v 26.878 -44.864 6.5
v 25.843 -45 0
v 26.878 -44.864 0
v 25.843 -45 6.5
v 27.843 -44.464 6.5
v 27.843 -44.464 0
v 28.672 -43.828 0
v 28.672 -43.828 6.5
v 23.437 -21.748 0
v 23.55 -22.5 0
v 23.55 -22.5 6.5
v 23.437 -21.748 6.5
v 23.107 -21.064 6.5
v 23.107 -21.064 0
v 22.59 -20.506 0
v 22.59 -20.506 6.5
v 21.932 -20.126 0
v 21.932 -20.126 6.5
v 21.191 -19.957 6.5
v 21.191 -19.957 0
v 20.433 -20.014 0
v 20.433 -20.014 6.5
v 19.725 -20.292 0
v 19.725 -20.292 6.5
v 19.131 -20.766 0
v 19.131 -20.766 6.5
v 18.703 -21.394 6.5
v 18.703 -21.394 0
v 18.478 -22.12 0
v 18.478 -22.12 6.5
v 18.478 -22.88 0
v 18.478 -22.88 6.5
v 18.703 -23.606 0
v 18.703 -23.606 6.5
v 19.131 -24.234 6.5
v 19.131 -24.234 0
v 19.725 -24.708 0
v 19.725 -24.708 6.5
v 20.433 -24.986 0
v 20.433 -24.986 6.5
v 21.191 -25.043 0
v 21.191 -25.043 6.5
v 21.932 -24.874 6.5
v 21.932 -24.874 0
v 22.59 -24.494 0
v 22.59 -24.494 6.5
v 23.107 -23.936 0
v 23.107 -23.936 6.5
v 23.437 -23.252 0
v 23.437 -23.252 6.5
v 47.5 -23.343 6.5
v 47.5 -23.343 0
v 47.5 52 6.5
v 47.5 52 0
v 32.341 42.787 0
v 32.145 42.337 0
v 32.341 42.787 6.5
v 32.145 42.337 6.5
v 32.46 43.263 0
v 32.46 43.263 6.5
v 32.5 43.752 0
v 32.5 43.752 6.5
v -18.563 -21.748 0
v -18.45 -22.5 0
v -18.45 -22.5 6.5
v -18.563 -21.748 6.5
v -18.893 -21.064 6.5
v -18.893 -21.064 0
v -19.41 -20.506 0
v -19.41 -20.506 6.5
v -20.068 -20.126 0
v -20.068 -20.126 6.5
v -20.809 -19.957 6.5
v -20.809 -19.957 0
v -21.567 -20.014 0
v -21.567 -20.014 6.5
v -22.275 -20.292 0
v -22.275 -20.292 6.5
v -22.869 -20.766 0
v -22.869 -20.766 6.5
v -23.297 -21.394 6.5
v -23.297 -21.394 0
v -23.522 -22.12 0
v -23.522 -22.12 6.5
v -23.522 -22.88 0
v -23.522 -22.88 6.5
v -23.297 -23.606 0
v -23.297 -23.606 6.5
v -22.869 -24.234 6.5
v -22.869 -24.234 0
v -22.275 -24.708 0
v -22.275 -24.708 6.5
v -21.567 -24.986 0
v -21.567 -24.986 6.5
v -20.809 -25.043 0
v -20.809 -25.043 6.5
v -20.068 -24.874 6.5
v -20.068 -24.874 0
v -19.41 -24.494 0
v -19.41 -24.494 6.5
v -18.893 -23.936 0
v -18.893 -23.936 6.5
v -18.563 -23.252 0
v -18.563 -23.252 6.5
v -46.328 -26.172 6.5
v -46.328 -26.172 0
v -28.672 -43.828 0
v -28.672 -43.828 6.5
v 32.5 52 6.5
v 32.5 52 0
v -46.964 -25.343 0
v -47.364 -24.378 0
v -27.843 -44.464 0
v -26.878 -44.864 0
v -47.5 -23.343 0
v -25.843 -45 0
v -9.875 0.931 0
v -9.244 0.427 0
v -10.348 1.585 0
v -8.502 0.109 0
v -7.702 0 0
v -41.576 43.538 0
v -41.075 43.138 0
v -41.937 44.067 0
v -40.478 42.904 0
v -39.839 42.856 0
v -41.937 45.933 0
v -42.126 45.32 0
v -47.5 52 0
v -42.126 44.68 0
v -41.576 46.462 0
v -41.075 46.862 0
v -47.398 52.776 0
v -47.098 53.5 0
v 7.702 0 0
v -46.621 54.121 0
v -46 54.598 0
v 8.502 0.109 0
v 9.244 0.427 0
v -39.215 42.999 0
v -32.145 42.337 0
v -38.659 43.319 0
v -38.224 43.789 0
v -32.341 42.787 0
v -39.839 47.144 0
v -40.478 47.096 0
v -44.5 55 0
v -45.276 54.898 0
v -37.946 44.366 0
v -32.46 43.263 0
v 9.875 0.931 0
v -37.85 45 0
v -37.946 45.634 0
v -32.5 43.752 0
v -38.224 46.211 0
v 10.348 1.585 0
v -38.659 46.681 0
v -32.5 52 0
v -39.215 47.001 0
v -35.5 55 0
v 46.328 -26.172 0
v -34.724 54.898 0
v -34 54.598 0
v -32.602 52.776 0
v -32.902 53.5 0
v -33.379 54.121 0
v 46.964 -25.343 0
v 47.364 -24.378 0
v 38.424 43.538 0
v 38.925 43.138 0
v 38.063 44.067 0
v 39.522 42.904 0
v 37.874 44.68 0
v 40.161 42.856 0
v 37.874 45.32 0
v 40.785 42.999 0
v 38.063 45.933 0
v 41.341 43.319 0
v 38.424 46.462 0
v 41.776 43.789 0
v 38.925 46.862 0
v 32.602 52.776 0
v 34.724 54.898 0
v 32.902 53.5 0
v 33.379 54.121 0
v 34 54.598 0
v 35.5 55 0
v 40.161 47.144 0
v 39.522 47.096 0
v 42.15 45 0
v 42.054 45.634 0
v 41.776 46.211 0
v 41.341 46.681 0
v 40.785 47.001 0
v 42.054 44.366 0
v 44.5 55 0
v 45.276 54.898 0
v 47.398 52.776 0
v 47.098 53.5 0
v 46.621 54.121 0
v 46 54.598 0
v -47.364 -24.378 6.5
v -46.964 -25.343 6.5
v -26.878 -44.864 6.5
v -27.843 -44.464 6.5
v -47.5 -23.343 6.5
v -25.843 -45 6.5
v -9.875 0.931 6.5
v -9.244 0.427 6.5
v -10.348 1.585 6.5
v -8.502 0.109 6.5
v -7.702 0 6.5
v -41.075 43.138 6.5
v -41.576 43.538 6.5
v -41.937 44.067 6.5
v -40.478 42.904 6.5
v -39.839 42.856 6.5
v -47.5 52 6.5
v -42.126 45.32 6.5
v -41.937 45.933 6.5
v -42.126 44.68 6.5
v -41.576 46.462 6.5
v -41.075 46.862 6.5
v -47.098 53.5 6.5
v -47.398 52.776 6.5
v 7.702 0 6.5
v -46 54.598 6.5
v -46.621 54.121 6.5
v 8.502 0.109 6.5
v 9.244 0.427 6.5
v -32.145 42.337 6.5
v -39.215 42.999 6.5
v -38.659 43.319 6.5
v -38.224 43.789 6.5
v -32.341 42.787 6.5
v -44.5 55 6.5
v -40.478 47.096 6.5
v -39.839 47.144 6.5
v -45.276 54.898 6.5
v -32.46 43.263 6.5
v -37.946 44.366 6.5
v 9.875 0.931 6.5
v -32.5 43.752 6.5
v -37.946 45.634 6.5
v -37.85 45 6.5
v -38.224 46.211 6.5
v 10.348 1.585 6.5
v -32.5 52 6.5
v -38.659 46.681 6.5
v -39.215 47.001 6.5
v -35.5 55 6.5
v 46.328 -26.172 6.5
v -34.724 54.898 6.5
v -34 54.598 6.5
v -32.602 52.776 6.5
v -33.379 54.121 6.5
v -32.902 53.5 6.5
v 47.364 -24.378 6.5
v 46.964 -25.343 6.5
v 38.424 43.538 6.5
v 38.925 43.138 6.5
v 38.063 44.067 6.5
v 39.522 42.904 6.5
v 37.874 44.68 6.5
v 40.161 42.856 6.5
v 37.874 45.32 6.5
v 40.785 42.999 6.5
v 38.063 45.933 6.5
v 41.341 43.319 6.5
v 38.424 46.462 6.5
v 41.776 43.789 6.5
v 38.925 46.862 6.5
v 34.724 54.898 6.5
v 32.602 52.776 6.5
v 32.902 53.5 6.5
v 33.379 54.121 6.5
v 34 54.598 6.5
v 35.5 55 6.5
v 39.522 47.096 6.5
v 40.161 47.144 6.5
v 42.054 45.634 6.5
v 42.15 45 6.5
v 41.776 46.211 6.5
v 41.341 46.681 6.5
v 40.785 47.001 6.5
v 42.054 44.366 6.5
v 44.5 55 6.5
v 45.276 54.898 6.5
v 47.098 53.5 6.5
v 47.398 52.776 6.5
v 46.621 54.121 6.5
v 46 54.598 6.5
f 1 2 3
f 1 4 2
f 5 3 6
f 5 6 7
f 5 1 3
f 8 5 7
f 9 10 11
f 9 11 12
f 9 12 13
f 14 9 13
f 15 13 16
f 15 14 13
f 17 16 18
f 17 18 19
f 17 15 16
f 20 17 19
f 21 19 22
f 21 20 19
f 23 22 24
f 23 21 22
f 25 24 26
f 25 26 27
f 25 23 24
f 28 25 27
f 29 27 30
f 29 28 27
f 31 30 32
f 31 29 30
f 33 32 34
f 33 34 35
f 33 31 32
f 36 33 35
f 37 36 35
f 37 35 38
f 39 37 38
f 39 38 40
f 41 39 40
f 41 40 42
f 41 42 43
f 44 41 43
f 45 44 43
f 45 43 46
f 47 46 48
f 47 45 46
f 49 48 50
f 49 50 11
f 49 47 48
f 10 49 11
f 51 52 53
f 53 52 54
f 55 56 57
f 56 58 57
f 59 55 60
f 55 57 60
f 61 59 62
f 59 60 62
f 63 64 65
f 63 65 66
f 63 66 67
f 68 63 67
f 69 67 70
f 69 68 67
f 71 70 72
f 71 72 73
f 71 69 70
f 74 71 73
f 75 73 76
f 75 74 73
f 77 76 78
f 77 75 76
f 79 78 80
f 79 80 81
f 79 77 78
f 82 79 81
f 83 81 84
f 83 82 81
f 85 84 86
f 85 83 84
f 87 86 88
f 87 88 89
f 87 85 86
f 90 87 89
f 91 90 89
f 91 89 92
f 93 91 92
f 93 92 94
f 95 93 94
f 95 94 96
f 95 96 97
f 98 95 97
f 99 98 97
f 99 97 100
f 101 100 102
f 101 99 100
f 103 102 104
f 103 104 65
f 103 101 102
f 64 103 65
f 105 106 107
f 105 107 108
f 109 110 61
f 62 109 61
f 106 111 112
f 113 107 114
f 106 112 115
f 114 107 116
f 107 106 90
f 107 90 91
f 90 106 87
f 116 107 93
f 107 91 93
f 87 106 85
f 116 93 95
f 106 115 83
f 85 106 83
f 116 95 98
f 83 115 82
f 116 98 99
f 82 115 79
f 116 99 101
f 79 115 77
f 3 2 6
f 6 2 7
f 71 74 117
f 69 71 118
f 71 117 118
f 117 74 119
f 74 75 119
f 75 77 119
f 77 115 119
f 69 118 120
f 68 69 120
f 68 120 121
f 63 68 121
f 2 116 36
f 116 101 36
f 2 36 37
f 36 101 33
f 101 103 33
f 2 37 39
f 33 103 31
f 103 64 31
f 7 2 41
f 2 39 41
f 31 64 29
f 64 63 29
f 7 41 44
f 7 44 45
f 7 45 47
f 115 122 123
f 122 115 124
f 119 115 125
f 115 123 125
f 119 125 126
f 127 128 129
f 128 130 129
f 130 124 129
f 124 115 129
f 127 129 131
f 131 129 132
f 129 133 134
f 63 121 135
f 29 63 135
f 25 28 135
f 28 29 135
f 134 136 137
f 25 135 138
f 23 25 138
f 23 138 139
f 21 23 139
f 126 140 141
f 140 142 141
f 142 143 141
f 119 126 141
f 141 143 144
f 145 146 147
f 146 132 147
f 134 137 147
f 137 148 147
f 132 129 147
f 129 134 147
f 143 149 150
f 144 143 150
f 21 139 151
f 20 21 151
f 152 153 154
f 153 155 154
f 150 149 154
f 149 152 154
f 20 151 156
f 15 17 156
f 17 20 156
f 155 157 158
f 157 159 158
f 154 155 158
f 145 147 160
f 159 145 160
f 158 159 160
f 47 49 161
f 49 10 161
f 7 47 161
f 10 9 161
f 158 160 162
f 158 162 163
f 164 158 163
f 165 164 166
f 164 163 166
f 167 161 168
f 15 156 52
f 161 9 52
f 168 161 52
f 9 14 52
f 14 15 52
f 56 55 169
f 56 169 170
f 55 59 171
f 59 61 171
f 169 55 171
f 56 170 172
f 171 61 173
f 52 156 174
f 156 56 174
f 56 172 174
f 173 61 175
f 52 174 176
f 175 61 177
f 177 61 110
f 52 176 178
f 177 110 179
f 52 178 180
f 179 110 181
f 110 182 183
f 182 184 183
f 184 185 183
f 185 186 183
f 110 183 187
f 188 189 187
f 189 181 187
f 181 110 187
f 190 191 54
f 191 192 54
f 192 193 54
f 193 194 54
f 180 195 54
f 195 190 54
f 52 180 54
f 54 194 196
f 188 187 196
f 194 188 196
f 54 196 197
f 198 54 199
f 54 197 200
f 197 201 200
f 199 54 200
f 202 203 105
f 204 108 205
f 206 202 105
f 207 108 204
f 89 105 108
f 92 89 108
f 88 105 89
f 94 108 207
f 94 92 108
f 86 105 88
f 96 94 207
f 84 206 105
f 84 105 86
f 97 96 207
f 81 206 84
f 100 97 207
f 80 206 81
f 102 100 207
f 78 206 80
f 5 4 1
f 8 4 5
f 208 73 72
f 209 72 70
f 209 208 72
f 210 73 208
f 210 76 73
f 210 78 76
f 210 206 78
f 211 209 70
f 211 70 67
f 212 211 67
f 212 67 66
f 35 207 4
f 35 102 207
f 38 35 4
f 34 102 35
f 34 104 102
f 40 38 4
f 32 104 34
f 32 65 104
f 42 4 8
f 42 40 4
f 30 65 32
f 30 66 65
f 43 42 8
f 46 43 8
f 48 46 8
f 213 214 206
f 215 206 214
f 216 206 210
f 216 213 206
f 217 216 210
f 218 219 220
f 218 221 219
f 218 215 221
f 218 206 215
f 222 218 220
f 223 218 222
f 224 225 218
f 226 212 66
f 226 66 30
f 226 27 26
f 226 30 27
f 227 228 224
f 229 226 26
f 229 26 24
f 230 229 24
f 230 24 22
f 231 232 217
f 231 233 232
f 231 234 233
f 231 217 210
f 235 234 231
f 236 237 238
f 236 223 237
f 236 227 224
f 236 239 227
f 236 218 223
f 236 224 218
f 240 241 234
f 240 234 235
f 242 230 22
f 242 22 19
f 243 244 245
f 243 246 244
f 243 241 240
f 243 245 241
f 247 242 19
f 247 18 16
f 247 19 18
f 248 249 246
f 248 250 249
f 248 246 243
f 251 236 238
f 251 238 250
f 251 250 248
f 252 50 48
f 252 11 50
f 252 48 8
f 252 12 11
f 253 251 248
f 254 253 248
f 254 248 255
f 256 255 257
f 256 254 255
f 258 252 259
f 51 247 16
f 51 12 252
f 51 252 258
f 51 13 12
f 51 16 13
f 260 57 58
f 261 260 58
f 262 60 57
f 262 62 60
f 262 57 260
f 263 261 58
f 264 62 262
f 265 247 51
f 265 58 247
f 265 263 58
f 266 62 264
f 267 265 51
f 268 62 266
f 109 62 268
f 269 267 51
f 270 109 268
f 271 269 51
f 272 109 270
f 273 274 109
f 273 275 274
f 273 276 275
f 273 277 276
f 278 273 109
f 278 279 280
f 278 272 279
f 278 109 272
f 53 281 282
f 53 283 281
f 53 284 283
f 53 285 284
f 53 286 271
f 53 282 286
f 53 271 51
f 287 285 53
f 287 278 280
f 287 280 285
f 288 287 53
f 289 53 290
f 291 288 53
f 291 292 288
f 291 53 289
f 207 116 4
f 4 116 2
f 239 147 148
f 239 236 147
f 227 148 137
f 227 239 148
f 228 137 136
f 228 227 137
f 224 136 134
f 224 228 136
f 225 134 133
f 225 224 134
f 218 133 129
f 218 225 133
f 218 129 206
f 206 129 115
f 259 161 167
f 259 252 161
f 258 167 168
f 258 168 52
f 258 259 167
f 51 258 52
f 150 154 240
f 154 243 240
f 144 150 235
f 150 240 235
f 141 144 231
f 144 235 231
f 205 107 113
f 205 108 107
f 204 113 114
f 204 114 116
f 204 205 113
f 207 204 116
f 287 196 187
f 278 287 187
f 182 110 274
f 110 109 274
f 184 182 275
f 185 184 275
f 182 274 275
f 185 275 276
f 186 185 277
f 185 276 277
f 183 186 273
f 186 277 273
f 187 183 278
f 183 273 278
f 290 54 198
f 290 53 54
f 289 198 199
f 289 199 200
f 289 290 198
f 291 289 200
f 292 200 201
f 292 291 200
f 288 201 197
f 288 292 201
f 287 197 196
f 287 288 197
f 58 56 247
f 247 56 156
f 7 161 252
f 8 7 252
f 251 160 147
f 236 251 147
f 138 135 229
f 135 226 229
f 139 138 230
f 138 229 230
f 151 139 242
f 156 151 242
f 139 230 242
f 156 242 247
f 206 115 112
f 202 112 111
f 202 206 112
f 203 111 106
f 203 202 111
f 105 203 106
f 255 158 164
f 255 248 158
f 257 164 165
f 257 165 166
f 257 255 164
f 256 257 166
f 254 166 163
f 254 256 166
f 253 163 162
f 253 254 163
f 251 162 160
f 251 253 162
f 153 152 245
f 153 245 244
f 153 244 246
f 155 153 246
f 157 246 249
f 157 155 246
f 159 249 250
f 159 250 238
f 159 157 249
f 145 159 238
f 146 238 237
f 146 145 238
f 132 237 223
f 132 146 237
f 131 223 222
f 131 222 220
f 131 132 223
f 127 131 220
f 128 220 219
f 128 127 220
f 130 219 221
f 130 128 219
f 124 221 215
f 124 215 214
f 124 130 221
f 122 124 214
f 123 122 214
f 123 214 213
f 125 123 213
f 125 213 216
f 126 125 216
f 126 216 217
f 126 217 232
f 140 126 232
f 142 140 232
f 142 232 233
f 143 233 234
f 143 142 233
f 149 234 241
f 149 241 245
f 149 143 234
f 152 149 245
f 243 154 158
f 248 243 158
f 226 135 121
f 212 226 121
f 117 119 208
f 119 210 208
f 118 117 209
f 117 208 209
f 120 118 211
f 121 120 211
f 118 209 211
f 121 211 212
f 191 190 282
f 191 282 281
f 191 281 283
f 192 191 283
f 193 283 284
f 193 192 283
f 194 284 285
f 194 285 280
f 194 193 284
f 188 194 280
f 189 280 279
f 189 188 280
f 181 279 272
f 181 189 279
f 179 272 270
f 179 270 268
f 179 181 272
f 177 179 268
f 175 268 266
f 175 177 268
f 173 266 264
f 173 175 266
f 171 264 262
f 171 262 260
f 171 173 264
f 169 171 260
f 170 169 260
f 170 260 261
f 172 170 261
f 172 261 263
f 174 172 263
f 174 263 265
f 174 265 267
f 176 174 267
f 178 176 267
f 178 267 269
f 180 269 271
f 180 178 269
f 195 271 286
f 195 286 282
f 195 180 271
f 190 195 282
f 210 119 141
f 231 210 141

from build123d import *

# Parameters (mm, degrees)
SKETCH1_R           = 2.55
SKETCH1_R_2         = 2.15
BOSS_EXTRUDE1_DEPTH = 6.5
FILLET1_R           = 3
CHAMFER1_SIZE       = 20
FILLET2_R           = 4


with BuildPart() as part:
    # Sketch1 → Boss-Extrude1 (new body)
    with BuildSketch(Plane.XY):
        Polygon((-32.5, 43), (-32.5, 55), (-47.5, 55), (-47.5, -45), (47.5, -45), (47.5, 55), (32.5, 55), (32.5, 43), (9.5, 0), (-9.5, 0), align=None)
        with Locations((-21, -22.5)):
            Circle(SKETCH1_R, mode=Mode.SUBTRACT)
        with Locations((21, -22.5)):
            Circle(SKETCH1_R, mode=Mode.SUBTRACT)
        with Locations((-40, 45)):
            Circle(SKETCH1_R_2, mode=Mode.SUBTRACT)
        with Locations((40, 45)):
            Circle(SKETCH1_R_2, mode=Mode.SUBTRACT)
    extrude(amount=BOSS_EXTRUDE1_DEPTH)

    # Fillet1
    fillet1_edges = [part.edges().sort_by_distance(p)[0] for p in [
        (9.5, 0, 3.25),
        (32.5, 43, 3.25),
        (32.5, 55, 3.25),
        (47.5, 55, 3.25),
        (-47.5, 55, 3.25),
        (-32.5, 55, 3.25),
        (-32.5, 43, 3.25),
        (-9.5, 0, 3.25),
    ]]
    fillet(fillet1_edges, radius=FILLET1_R)

    # Chamfer1
    chamfer1_edges = [part.edges().sort_by_distance(p)[0] for p in [
        (47.5, -45, 3.25),
        (-47.5, -45, 3.25),
    ]]
    chamfer(chamfer1_edges, length=CHAMFER1_SIZE)

    # Fillet2
    fillet2_edges = [part.edges().sort_by_distance(p)[0] for p in [
        (47.5, -25, 3.25),
        (-27.5, -45, 3.25),
        (27.5, -45, 3.25),
        (-47.5, -25, 3.25),
    ]]
    fillet(fillet2_edges, radius=FILLET2_R)


solid = part.part
